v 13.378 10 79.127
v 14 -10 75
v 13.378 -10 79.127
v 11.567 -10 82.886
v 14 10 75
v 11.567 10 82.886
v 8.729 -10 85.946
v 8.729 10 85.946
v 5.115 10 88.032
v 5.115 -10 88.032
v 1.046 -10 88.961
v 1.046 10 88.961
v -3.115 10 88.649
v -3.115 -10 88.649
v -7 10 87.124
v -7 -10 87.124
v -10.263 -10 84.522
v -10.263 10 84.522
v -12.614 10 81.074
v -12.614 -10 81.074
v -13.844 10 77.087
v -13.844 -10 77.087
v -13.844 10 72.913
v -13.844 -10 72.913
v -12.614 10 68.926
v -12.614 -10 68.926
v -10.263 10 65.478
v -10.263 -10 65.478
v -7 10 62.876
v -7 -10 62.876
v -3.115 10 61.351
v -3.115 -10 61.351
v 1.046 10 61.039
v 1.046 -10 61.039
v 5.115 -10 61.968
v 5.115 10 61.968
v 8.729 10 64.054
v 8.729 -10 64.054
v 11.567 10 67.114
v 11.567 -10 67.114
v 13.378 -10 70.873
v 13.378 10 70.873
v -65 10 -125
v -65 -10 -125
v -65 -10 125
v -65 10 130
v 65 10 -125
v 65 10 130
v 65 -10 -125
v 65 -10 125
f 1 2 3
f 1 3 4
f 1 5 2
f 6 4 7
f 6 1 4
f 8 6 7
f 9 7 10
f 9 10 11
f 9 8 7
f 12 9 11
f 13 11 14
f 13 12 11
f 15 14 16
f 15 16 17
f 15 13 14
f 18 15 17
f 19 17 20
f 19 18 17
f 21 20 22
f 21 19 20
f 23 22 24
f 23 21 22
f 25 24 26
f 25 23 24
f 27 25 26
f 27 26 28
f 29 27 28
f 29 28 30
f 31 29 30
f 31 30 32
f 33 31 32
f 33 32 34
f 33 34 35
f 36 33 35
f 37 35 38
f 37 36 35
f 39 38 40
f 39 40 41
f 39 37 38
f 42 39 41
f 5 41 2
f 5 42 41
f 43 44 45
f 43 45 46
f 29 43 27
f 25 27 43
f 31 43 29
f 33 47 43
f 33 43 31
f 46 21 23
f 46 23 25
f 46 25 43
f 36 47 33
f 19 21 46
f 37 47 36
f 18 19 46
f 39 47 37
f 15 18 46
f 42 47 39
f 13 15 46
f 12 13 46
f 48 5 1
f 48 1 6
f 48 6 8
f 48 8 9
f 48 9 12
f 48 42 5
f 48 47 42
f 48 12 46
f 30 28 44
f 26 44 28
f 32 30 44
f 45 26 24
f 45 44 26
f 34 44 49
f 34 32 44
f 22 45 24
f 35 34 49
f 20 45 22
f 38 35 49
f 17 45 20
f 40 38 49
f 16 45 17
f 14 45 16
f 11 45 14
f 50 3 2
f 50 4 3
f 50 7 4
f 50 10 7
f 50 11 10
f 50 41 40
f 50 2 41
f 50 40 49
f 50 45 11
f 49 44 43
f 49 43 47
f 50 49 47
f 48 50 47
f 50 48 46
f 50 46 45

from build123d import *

# Parameters (mm, degrees)
F0_W     = 130
F0_H     = 250
F0_R     = 14
F1_DEPTH = 10
F5_DEPTH = 130


with BuildPart() as f1:
    # F0 (on Front) → F1 (new body, symmetric)
    with BuildSketch(Plane.XZ):
        Rectangle(F0_W, F0_H)
        with Locations((0, 75)):
            Circle(F0_R, mode=Mode.SUBTRACT)
    extrude(amount=F1_DEPTH, both=True)

    # F4 (on face) → F5 (join)
    with BuildSketch(Plane.YZ.offset(65)):
        Polygon((-10, 125), (10, 125), (10, 130), align=None)
    extrude(amount=-F5_DEPTH)


solid = f1.part
